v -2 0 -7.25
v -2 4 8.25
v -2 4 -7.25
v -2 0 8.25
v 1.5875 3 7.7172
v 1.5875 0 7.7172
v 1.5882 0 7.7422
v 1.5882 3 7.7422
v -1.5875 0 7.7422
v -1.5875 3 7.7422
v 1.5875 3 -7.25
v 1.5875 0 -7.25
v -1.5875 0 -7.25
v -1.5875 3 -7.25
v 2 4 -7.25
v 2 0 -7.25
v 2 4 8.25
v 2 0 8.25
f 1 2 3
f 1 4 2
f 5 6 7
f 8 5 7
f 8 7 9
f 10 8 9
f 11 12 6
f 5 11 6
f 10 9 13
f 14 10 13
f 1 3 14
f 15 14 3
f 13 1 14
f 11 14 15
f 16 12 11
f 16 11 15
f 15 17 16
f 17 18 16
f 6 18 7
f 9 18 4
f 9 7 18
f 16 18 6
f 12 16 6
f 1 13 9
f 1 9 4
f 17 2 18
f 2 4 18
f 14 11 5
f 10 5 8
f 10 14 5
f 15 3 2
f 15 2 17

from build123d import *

# Parameters (mm, degrees)
BOSS_EXTRUDE1_DEPTH = 3
SKETCH2_W           = 4
SKETCH2_H           = 15.5
BOSS_EXTRUDE2_DEPTH = 1
CUT_EXTRUDE1_DEPTH  = 0.25
CUT_EXTRUDE7_DEPTH  = 6


with BuildPart() as part:
    # Sketch1 → Boss-Extrude1 (new body)
    with BuildSketch(Plane(origin=(0, 0, 0), x_dir=(1, 0, 0), z_dir=(0, 1, 0))):
        Polygon((-1, -7.25), (1, -7.25), (1, 7.25), (2, 7.25), (2, -7.25), (2, -8.25), (1, -8.25), (-2, -8.25), (-2, 7.25), (-1, 7.25), align=None)
    extrude(amount=BOSS_EXTRUDE1_DEPTH)

    # Sketch2 → Boss-Extrude2 (add)
    with BuildSketch(Plane(origin=(0, 3, 0), x_dir=(1, 0, 0), z_dir=(0, 1, 0))):
        with Locations((0, -0.5)):
            Rectangle(SKETCH2_W, SKETCH2_H)
    extrude(amount=BOSS_EXTRUDE2_DEPTH)

    # Sketch3 → Cut-Extrude1 (cut)
    with BuildSketch(Plane.XZ):
        Polygon((-1, 7.25), (1, 7.25), (1, -7.25), (1.5, -7.25), (1.5, 7.717200742), (-1.5, 7.717200742), (-1.5, -7.25), (-1, -7.25), align=None)
    extrude(amount=-CUT_EXTRUDE1_DEPTH, mode=Mode.SUBTRACT)

    # Sketch9 → Cut-Extrude7 (cut)
    with BuildSketch(Plane(origin=(31.168539268, -3, 26.546214854), x_dir=(-0.7071067811865431, 0, 0.7071067811865519), z_dir=(0, -1, 0))):
        Polygon((7.620004071, 34.212873731), (9.865582661, 36.458452321), (9.847893929, 36.476141053), (-10.673980141, 56.998015123), (-12.919044171, 54.752951093), (7.602829899, 34.231077023), align=None)
    extrude(amount=-CUT_EXTRUDE7_DEPTH, mode=Mode.SUBTRACT)


solid = part.part
